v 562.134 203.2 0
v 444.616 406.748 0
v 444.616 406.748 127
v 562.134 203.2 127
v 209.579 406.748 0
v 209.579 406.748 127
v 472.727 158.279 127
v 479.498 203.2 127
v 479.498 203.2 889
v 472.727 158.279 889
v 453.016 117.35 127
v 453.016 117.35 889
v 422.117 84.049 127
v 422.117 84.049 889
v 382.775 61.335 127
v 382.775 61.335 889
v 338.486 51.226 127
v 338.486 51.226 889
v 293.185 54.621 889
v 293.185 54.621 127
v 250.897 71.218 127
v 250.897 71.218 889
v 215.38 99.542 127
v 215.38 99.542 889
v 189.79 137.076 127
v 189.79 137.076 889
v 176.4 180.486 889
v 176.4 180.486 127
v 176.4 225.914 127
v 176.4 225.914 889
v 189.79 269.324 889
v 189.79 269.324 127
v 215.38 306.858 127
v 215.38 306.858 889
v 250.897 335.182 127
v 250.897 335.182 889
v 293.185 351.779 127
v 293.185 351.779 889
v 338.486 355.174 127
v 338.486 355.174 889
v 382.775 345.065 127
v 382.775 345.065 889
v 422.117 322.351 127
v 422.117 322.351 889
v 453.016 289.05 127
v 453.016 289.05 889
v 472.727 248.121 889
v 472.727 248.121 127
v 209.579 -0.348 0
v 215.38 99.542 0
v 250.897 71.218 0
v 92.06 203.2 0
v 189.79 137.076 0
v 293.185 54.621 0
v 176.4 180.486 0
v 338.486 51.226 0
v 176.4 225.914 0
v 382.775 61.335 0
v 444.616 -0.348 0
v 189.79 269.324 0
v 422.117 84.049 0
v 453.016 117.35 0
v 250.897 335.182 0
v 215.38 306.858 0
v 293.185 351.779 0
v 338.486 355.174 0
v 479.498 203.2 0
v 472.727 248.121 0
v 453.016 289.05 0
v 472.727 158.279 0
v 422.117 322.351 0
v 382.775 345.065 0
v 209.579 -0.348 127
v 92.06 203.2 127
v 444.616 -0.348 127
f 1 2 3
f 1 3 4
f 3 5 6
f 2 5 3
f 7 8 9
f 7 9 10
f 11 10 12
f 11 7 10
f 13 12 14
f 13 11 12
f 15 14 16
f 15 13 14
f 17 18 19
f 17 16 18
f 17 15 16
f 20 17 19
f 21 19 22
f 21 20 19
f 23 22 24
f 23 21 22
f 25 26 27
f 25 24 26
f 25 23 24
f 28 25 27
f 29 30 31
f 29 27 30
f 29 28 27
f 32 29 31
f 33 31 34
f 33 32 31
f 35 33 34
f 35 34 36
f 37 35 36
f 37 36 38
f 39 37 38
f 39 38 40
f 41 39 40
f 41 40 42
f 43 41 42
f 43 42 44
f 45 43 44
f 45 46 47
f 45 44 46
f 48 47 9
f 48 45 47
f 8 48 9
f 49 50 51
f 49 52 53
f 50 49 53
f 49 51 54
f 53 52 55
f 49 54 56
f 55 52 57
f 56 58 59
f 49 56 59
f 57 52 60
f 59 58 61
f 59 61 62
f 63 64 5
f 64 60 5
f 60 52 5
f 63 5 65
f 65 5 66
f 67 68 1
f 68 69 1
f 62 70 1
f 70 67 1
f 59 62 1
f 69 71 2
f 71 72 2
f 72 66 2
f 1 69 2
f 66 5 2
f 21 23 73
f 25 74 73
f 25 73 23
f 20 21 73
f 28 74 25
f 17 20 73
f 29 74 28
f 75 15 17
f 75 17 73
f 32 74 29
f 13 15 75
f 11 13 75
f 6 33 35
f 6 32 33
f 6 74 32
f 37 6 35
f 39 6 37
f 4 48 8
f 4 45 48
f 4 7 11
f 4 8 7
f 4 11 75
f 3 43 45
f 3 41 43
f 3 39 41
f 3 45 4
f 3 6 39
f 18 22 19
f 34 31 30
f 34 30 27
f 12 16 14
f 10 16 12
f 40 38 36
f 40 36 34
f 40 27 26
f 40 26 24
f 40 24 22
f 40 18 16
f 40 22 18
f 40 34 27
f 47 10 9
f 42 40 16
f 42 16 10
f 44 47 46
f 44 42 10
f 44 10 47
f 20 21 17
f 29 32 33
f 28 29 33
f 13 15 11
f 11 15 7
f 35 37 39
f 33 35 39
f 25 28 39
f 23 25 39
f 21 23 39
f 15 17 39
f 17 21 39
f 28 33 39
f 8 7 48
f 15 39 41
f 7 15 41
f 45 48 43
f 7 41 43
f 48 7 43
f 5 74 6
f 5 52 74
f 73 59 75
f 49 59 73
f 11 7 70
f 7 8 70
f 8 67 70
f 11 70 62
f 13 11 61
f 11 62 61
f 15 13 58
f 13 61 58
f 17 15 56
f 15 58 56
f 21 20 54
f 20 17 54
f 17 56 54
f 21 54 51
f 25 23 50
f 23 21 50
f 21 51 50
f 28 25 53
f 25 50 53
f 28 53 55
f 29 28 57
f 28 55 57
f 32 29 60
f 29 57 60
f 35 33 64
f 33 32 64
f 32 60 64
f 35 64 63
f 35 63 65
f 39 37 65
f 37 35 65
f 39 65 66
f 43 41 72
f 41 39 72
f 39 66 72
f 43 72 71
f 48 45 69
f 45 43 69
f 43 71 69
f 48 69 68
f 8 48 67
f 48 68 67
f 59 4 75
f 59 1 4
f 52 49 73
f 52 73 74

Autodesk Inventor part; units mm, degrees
ref_plane "YZ Plane" through (0, 0, 0) normal (1, 0, 0) x (0, 1, 0)
ref_plane "XZ Plane" through (0, 0, 0) normal (0, 1, 0) x (-1, 0, 0)
ref_plane "XY Plane" through (0, 0, 0) normal (0, 0, 1) x (1, 0, 0)
sketch "Sketch1" plane through (0, 0, 0) normal (0, 0, 1) x (1, 0, 0)
  line L0 (1.6553, 0) -> (1.6553, 406.4)
  line L1 (562.1345, 203.2) -> (444.616, -0.348)
  line L2 (444.616, -0.348) -> (209.579, -0.348)
  line L3 (209.579, -0.348) -> (92.0605, 203.2)
  line L4 (92.0605, 203.2) -> (209.579, 406.748)
  line L5 (209.579, 406.748) -> (444.616, 406.748)
  line L6 (444.616, 406.748) -> (562.1345, 203.2)
  circle A0 centre (327.0975, 203.2) radius 152.4
  point P0 (0, 0)
  dimension "d0" = 406.4
  dimension "d1" = 304.8
extrude "Extrusion1" add sketch "Sketch1" along normal blind 127
sketch "Sketch2" plane through (0, 0, 127) normal (0, 0, 1) x (1, 0, 0)
  circle A0 centre (327.0975, 203.2) radius 152.4 projected
  circle A1 centre (327.0975, 203.2) radius 152.4
  point P0 (0, 0)
  dimension "d4" = 304.8
extrude "Extrusion2" add sketch "Sketch2" along normal blind 762
sketch "Sketch3" plane through (0, 0, 0) normal (0, 0, 1) x (1, 0, 0)
  point P0 (0, 0)
properties part number "nut"
